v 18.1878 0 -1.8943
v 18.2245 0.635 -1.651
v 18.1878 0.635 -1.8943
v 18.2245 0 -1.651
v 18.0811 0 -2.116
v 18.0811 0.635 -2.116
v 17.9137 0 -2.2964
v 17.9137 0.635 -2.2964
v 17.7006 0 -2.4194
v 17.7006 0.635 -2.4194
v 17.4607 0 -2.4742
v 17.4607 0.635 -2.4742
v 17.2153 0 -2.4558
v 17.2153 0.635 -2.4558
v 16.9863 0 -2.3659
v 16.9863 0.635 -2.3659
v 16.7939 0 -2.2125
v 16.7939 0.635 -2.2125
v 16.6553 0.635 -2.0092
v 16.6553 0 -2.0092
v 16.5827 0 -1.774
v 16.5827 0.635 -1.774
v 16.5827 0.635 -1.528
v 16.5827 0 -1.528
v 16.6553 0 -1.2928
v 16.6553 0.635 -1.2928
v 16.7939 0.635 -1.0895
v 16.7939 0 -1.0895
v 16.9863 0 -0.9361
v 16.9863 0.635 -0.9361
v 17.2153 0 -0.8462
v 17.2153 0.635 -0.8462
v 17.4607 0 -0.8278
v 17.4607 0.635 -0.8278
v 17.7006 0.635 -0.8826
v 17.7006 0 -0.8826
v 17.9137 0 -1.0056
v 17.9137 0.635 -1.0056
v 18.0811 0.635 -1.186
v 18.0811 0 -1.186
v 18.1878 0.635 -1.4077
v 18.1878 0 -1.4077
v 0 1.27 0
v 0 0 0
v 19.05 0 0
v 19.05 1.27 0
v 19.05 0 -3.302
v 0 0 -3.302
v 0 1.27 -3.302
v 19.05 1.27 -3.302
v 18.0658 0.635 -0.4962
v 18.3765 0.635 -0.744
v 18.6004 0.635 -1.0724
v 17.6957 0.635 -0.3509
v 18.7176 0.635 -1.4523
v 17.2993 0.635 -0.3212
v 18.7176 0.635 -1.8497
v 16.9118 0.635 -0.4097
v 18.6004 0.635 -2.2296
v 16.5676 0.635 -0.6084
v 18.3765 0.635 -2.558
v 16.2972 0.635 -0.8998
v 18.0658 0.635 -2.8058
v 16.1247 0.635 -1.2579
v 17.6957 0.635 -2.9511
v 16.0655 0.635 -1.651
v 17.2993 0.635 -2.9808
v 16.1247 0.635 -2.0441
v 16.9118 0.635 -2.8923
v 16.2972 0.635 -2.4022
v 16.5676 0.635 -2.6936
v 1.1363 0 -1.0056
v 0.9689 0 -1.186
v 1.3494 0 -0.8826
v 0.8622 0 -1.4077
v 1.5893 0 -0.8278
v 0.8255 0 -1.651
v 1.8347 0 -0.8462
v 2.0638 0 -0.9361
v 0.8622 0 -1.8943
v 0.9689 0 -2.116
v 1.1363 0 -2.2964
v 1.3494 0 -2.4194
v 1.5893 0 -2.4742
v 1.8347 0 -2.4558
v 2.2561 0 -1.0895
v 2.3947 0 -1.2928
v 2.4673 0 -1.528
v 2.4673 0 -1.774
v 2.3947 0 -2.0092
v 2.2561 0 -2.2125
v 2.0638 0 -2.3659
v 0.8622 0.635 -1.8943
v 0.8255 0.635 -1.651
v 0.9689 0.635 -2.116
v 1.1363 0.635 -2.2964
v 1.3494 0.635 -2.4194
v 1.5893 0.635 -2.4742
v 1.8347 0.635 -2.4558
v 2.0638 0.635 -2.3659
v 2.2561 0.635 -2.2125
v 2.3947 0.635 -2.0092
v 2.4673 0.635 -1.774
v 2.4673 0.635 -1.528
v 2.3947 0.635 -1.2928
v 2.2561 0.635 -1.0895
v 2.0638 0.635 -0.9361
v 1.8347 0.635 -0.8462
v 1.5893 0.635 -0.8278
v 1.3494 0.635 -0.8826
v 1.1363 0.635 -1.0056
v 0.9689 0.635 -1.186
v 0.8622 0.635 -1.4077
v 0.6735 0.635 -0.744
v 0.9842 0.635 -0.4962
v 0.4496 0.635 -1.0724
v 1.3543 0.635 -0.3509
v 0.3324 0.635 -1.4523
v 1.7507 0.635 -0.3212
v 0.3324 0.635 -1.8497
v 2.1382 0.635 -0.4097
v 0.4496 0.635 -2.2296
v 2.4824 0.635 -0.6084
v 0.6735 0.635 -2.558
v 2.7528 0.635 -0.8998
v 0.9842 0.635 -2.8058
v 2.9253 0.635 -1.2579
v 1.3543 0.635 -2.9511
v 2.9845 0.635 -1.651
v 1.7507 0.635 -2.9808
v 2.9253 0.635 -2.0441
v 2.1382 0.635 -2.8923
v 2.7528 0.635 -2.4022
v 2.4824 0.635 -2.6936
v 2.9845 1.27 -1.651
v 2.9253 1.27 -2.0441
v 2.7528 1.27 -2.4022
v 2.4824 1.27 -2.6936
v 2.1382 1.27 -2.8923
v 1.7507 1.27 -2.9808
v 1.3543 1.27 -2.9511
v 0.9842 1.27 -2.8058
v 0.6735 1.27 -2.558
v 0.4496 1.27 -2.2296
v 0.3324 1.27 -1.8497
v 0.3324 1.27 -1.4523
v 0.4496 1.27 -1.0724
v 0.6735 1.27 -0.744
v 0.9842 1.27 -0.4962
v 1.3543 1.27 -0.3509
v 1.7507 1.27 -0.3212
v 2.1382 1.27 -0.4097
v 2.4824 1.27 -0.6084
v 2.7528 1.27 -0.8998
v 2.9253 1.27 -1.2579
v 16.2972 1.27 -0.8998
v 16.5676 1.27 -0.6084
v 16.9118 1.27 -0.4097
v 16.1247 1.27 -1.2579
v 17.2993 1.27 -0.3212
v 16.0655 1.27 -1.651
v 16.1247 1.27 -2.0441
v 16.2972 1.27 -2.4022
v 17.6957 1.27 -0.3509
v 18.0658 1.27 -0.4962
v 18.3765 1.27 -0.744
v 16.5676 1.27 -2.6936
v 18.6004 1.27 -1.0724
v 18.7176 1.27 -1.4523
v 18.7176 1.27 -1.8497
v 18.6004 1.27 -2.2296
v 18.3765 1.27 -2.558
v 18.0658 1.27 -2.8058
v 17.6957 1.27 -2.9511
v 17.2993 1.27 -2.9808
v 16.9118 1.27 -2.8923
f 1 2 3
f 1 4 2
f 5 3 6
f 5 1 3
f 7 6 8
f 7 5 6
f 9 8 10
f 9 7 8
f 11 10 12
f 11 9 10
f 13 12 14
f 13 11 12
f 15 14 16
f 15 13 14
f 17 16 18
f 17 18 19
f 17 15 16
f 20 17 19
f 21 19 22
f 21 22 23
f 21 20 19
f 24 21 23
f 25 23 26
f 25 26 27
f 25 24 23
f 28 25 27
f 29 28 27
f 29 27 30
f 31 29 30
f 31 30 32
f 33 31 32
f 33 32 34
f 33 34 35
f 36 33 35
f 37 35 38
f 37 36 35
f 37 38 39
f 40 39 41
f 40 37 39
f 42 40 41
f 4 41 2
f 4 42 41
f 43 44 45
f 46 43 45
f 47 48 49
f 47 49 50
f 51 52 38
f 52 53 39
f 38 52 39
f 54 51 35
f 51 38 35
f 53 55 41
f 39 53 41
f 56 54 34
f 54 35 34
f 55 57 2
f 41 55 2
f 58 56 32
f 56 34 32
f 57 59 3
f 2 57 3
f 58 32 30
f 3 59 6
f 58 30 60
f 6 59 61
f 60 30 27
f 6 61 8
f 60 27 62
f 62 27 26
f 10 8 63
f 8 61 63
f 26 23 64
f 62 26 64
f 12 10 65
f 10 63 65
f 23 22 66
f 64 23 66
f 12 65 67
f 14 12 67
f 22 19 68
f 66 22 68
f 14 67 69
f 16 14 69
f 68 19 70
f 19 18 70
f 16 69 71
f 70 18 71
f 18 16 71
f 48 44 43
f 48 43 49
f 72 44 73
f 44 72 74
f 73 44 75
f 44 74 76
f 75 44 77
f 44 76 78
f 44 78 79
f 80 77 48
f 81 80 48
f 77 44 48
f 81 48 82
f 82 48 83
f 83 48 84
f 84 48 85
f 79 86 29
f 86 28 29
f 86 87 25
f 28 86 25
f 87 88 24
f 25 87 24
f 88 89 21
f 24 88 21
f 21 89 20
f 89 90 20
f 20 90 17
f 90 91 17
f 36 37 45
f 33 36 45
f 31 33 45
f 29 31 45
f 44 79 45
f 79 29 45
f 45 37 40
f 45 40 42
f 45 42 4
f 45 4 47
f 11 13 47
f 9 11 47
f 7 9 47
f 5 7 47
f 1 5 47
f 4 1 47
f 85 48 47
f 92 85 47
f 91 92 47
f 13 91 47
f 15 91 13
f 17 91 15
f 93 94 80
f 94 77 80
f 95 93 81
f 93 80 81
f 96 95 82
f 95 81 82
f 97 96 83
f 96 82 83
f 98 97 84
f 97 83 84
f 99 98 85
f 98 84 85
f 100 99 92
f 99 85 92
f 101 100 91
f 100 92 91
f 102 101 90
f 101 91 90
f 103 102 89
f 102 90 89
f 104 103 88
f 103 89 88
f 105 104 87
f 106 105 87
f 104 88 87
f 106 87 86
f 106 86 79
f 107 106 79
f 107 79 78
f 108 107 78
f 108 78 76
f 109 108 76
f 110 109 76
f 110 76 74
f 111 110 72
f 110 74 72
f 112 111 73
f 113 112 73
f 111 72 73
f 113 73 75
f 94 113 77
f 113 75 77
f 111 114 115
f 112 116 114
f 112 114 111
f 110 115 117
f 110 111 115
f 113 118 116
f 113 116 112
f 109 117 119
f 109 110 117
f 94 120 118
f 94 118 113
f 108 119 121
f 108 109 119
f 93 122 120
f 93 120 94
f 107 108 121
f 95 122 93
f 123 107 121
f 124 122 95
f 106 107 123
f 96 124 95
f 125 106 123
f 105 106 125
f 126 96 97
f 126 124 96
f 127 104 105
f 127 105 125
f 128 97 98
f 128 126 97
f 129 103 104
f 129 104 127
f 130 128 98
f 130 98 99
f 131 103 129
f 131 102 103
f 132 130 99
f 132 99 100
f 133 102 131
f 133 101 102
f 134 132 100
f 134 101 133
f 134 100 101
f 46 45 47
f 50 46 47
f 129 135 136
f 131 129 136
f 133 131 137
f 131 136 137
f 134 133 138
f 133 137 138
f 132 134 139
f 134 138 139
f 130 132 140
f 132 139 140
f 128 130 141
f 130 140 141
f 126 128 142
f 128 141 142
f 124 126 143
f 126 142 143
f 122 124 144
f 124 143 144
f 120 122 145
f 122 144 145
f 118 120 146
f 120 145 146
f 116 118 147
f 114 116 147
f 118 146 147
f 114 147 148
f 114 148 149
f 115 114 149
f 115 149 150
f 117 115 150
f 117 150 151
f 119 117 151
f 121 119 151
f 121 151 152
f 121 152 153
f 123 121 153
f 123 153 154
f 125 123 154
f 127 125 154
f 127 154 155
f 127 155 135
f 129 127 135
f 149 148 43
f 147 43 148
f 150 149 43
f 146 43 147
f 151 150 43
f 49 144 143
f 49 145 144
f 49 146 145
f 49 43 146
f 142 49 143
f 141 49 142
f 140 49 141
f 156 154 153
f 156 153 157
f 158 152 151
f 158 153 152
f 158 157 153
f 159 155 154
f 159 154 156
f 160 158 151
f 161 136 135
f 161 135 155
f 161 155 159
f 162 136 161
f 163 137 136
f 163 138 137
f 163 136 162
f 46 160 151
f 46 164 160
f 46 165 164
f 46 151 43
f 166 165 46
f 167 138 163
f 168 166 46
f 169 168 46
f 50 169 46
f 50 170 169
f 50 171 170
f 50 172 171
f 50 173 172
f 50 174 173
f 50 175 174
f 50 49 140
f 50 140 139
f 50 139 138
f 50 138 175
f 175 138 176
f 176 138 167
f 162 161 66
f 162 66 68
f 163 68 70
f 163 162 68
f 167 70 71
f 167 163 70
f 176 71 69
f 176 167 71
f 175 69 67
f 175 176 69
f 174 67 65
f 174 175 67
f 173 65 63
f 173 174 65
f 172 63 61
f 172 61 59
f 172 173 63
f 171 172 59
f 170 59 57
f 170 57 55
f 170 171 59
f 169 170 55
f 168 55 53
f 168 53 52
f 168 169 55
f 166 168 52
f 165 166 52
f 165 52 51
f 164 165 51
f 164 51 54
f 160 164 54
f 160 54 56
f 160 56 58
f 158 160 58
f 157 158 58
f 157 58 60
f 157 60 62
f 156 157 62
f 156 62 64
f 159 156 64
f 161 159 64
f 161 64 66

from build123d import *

# Parameters (mm, degrees)
SKETCH1_W                                           = 19.05
SKETCH1_H                                           = 3.302
BOSS_EXTRUDE1_DEPTH                                 = 1.27
CBORE_FOR_00_BINDING_HEAD_MACHINE_SCREW_D           = 1.651
CBORE_FOR_00_BINDING_HEAD_MACHINE_SCREW_CBORE_D     = 2.667
CBORE_FOR_00_BINDING_HEAD_MACHINE_SCREW_CBORE_DEPTH = 0.635


with BuildPart() as part:
    # Sketch1 → Boss-Extrude1 (new body)
    with BuildSketch(Plane(origin=(0, 0, 0), x_dir=(1, 0, 0), z_dir=(0, 1, 0))):
        with Locations((9.525, 1.651)):
            Rectangle(SKETCH1_W, SKETCH1_H)
    extrude(amount=BOSS_EXTRUDE1_DEPTH)

    # CBORE for #00 Binding Head Machine Screw1 (through all)
    with Locations(Plane(origin=(0, 1.27, 0), x_dir=(1, 0, 0), z_dir=(0, 1, 0))):
        with Locations((1.651, 1.651)):
            cbore_for_00_binding_head_machine_screw = CounterBoreHole(CBORE_FOR_00_BINDING_HEAD_MACHINE_SCREW_D / 2, CBORE_FOR_00_BINDING_HEAD_MACHINE_SCREW_CBORE_D / 2, CBORE_FOR_00_BINDING_HEAD_MACHINE_SCREW_CBORE_DEPTH)

    # Mirror1: CBORE for #00 Binding Head Machine Screw1 across plane
    add(cbore_for_00_binding_head_machine_screw.mirror(Plane.ZY.offset(-9.525)), mode=Mode.SUBTRACT)


solid = part.part
